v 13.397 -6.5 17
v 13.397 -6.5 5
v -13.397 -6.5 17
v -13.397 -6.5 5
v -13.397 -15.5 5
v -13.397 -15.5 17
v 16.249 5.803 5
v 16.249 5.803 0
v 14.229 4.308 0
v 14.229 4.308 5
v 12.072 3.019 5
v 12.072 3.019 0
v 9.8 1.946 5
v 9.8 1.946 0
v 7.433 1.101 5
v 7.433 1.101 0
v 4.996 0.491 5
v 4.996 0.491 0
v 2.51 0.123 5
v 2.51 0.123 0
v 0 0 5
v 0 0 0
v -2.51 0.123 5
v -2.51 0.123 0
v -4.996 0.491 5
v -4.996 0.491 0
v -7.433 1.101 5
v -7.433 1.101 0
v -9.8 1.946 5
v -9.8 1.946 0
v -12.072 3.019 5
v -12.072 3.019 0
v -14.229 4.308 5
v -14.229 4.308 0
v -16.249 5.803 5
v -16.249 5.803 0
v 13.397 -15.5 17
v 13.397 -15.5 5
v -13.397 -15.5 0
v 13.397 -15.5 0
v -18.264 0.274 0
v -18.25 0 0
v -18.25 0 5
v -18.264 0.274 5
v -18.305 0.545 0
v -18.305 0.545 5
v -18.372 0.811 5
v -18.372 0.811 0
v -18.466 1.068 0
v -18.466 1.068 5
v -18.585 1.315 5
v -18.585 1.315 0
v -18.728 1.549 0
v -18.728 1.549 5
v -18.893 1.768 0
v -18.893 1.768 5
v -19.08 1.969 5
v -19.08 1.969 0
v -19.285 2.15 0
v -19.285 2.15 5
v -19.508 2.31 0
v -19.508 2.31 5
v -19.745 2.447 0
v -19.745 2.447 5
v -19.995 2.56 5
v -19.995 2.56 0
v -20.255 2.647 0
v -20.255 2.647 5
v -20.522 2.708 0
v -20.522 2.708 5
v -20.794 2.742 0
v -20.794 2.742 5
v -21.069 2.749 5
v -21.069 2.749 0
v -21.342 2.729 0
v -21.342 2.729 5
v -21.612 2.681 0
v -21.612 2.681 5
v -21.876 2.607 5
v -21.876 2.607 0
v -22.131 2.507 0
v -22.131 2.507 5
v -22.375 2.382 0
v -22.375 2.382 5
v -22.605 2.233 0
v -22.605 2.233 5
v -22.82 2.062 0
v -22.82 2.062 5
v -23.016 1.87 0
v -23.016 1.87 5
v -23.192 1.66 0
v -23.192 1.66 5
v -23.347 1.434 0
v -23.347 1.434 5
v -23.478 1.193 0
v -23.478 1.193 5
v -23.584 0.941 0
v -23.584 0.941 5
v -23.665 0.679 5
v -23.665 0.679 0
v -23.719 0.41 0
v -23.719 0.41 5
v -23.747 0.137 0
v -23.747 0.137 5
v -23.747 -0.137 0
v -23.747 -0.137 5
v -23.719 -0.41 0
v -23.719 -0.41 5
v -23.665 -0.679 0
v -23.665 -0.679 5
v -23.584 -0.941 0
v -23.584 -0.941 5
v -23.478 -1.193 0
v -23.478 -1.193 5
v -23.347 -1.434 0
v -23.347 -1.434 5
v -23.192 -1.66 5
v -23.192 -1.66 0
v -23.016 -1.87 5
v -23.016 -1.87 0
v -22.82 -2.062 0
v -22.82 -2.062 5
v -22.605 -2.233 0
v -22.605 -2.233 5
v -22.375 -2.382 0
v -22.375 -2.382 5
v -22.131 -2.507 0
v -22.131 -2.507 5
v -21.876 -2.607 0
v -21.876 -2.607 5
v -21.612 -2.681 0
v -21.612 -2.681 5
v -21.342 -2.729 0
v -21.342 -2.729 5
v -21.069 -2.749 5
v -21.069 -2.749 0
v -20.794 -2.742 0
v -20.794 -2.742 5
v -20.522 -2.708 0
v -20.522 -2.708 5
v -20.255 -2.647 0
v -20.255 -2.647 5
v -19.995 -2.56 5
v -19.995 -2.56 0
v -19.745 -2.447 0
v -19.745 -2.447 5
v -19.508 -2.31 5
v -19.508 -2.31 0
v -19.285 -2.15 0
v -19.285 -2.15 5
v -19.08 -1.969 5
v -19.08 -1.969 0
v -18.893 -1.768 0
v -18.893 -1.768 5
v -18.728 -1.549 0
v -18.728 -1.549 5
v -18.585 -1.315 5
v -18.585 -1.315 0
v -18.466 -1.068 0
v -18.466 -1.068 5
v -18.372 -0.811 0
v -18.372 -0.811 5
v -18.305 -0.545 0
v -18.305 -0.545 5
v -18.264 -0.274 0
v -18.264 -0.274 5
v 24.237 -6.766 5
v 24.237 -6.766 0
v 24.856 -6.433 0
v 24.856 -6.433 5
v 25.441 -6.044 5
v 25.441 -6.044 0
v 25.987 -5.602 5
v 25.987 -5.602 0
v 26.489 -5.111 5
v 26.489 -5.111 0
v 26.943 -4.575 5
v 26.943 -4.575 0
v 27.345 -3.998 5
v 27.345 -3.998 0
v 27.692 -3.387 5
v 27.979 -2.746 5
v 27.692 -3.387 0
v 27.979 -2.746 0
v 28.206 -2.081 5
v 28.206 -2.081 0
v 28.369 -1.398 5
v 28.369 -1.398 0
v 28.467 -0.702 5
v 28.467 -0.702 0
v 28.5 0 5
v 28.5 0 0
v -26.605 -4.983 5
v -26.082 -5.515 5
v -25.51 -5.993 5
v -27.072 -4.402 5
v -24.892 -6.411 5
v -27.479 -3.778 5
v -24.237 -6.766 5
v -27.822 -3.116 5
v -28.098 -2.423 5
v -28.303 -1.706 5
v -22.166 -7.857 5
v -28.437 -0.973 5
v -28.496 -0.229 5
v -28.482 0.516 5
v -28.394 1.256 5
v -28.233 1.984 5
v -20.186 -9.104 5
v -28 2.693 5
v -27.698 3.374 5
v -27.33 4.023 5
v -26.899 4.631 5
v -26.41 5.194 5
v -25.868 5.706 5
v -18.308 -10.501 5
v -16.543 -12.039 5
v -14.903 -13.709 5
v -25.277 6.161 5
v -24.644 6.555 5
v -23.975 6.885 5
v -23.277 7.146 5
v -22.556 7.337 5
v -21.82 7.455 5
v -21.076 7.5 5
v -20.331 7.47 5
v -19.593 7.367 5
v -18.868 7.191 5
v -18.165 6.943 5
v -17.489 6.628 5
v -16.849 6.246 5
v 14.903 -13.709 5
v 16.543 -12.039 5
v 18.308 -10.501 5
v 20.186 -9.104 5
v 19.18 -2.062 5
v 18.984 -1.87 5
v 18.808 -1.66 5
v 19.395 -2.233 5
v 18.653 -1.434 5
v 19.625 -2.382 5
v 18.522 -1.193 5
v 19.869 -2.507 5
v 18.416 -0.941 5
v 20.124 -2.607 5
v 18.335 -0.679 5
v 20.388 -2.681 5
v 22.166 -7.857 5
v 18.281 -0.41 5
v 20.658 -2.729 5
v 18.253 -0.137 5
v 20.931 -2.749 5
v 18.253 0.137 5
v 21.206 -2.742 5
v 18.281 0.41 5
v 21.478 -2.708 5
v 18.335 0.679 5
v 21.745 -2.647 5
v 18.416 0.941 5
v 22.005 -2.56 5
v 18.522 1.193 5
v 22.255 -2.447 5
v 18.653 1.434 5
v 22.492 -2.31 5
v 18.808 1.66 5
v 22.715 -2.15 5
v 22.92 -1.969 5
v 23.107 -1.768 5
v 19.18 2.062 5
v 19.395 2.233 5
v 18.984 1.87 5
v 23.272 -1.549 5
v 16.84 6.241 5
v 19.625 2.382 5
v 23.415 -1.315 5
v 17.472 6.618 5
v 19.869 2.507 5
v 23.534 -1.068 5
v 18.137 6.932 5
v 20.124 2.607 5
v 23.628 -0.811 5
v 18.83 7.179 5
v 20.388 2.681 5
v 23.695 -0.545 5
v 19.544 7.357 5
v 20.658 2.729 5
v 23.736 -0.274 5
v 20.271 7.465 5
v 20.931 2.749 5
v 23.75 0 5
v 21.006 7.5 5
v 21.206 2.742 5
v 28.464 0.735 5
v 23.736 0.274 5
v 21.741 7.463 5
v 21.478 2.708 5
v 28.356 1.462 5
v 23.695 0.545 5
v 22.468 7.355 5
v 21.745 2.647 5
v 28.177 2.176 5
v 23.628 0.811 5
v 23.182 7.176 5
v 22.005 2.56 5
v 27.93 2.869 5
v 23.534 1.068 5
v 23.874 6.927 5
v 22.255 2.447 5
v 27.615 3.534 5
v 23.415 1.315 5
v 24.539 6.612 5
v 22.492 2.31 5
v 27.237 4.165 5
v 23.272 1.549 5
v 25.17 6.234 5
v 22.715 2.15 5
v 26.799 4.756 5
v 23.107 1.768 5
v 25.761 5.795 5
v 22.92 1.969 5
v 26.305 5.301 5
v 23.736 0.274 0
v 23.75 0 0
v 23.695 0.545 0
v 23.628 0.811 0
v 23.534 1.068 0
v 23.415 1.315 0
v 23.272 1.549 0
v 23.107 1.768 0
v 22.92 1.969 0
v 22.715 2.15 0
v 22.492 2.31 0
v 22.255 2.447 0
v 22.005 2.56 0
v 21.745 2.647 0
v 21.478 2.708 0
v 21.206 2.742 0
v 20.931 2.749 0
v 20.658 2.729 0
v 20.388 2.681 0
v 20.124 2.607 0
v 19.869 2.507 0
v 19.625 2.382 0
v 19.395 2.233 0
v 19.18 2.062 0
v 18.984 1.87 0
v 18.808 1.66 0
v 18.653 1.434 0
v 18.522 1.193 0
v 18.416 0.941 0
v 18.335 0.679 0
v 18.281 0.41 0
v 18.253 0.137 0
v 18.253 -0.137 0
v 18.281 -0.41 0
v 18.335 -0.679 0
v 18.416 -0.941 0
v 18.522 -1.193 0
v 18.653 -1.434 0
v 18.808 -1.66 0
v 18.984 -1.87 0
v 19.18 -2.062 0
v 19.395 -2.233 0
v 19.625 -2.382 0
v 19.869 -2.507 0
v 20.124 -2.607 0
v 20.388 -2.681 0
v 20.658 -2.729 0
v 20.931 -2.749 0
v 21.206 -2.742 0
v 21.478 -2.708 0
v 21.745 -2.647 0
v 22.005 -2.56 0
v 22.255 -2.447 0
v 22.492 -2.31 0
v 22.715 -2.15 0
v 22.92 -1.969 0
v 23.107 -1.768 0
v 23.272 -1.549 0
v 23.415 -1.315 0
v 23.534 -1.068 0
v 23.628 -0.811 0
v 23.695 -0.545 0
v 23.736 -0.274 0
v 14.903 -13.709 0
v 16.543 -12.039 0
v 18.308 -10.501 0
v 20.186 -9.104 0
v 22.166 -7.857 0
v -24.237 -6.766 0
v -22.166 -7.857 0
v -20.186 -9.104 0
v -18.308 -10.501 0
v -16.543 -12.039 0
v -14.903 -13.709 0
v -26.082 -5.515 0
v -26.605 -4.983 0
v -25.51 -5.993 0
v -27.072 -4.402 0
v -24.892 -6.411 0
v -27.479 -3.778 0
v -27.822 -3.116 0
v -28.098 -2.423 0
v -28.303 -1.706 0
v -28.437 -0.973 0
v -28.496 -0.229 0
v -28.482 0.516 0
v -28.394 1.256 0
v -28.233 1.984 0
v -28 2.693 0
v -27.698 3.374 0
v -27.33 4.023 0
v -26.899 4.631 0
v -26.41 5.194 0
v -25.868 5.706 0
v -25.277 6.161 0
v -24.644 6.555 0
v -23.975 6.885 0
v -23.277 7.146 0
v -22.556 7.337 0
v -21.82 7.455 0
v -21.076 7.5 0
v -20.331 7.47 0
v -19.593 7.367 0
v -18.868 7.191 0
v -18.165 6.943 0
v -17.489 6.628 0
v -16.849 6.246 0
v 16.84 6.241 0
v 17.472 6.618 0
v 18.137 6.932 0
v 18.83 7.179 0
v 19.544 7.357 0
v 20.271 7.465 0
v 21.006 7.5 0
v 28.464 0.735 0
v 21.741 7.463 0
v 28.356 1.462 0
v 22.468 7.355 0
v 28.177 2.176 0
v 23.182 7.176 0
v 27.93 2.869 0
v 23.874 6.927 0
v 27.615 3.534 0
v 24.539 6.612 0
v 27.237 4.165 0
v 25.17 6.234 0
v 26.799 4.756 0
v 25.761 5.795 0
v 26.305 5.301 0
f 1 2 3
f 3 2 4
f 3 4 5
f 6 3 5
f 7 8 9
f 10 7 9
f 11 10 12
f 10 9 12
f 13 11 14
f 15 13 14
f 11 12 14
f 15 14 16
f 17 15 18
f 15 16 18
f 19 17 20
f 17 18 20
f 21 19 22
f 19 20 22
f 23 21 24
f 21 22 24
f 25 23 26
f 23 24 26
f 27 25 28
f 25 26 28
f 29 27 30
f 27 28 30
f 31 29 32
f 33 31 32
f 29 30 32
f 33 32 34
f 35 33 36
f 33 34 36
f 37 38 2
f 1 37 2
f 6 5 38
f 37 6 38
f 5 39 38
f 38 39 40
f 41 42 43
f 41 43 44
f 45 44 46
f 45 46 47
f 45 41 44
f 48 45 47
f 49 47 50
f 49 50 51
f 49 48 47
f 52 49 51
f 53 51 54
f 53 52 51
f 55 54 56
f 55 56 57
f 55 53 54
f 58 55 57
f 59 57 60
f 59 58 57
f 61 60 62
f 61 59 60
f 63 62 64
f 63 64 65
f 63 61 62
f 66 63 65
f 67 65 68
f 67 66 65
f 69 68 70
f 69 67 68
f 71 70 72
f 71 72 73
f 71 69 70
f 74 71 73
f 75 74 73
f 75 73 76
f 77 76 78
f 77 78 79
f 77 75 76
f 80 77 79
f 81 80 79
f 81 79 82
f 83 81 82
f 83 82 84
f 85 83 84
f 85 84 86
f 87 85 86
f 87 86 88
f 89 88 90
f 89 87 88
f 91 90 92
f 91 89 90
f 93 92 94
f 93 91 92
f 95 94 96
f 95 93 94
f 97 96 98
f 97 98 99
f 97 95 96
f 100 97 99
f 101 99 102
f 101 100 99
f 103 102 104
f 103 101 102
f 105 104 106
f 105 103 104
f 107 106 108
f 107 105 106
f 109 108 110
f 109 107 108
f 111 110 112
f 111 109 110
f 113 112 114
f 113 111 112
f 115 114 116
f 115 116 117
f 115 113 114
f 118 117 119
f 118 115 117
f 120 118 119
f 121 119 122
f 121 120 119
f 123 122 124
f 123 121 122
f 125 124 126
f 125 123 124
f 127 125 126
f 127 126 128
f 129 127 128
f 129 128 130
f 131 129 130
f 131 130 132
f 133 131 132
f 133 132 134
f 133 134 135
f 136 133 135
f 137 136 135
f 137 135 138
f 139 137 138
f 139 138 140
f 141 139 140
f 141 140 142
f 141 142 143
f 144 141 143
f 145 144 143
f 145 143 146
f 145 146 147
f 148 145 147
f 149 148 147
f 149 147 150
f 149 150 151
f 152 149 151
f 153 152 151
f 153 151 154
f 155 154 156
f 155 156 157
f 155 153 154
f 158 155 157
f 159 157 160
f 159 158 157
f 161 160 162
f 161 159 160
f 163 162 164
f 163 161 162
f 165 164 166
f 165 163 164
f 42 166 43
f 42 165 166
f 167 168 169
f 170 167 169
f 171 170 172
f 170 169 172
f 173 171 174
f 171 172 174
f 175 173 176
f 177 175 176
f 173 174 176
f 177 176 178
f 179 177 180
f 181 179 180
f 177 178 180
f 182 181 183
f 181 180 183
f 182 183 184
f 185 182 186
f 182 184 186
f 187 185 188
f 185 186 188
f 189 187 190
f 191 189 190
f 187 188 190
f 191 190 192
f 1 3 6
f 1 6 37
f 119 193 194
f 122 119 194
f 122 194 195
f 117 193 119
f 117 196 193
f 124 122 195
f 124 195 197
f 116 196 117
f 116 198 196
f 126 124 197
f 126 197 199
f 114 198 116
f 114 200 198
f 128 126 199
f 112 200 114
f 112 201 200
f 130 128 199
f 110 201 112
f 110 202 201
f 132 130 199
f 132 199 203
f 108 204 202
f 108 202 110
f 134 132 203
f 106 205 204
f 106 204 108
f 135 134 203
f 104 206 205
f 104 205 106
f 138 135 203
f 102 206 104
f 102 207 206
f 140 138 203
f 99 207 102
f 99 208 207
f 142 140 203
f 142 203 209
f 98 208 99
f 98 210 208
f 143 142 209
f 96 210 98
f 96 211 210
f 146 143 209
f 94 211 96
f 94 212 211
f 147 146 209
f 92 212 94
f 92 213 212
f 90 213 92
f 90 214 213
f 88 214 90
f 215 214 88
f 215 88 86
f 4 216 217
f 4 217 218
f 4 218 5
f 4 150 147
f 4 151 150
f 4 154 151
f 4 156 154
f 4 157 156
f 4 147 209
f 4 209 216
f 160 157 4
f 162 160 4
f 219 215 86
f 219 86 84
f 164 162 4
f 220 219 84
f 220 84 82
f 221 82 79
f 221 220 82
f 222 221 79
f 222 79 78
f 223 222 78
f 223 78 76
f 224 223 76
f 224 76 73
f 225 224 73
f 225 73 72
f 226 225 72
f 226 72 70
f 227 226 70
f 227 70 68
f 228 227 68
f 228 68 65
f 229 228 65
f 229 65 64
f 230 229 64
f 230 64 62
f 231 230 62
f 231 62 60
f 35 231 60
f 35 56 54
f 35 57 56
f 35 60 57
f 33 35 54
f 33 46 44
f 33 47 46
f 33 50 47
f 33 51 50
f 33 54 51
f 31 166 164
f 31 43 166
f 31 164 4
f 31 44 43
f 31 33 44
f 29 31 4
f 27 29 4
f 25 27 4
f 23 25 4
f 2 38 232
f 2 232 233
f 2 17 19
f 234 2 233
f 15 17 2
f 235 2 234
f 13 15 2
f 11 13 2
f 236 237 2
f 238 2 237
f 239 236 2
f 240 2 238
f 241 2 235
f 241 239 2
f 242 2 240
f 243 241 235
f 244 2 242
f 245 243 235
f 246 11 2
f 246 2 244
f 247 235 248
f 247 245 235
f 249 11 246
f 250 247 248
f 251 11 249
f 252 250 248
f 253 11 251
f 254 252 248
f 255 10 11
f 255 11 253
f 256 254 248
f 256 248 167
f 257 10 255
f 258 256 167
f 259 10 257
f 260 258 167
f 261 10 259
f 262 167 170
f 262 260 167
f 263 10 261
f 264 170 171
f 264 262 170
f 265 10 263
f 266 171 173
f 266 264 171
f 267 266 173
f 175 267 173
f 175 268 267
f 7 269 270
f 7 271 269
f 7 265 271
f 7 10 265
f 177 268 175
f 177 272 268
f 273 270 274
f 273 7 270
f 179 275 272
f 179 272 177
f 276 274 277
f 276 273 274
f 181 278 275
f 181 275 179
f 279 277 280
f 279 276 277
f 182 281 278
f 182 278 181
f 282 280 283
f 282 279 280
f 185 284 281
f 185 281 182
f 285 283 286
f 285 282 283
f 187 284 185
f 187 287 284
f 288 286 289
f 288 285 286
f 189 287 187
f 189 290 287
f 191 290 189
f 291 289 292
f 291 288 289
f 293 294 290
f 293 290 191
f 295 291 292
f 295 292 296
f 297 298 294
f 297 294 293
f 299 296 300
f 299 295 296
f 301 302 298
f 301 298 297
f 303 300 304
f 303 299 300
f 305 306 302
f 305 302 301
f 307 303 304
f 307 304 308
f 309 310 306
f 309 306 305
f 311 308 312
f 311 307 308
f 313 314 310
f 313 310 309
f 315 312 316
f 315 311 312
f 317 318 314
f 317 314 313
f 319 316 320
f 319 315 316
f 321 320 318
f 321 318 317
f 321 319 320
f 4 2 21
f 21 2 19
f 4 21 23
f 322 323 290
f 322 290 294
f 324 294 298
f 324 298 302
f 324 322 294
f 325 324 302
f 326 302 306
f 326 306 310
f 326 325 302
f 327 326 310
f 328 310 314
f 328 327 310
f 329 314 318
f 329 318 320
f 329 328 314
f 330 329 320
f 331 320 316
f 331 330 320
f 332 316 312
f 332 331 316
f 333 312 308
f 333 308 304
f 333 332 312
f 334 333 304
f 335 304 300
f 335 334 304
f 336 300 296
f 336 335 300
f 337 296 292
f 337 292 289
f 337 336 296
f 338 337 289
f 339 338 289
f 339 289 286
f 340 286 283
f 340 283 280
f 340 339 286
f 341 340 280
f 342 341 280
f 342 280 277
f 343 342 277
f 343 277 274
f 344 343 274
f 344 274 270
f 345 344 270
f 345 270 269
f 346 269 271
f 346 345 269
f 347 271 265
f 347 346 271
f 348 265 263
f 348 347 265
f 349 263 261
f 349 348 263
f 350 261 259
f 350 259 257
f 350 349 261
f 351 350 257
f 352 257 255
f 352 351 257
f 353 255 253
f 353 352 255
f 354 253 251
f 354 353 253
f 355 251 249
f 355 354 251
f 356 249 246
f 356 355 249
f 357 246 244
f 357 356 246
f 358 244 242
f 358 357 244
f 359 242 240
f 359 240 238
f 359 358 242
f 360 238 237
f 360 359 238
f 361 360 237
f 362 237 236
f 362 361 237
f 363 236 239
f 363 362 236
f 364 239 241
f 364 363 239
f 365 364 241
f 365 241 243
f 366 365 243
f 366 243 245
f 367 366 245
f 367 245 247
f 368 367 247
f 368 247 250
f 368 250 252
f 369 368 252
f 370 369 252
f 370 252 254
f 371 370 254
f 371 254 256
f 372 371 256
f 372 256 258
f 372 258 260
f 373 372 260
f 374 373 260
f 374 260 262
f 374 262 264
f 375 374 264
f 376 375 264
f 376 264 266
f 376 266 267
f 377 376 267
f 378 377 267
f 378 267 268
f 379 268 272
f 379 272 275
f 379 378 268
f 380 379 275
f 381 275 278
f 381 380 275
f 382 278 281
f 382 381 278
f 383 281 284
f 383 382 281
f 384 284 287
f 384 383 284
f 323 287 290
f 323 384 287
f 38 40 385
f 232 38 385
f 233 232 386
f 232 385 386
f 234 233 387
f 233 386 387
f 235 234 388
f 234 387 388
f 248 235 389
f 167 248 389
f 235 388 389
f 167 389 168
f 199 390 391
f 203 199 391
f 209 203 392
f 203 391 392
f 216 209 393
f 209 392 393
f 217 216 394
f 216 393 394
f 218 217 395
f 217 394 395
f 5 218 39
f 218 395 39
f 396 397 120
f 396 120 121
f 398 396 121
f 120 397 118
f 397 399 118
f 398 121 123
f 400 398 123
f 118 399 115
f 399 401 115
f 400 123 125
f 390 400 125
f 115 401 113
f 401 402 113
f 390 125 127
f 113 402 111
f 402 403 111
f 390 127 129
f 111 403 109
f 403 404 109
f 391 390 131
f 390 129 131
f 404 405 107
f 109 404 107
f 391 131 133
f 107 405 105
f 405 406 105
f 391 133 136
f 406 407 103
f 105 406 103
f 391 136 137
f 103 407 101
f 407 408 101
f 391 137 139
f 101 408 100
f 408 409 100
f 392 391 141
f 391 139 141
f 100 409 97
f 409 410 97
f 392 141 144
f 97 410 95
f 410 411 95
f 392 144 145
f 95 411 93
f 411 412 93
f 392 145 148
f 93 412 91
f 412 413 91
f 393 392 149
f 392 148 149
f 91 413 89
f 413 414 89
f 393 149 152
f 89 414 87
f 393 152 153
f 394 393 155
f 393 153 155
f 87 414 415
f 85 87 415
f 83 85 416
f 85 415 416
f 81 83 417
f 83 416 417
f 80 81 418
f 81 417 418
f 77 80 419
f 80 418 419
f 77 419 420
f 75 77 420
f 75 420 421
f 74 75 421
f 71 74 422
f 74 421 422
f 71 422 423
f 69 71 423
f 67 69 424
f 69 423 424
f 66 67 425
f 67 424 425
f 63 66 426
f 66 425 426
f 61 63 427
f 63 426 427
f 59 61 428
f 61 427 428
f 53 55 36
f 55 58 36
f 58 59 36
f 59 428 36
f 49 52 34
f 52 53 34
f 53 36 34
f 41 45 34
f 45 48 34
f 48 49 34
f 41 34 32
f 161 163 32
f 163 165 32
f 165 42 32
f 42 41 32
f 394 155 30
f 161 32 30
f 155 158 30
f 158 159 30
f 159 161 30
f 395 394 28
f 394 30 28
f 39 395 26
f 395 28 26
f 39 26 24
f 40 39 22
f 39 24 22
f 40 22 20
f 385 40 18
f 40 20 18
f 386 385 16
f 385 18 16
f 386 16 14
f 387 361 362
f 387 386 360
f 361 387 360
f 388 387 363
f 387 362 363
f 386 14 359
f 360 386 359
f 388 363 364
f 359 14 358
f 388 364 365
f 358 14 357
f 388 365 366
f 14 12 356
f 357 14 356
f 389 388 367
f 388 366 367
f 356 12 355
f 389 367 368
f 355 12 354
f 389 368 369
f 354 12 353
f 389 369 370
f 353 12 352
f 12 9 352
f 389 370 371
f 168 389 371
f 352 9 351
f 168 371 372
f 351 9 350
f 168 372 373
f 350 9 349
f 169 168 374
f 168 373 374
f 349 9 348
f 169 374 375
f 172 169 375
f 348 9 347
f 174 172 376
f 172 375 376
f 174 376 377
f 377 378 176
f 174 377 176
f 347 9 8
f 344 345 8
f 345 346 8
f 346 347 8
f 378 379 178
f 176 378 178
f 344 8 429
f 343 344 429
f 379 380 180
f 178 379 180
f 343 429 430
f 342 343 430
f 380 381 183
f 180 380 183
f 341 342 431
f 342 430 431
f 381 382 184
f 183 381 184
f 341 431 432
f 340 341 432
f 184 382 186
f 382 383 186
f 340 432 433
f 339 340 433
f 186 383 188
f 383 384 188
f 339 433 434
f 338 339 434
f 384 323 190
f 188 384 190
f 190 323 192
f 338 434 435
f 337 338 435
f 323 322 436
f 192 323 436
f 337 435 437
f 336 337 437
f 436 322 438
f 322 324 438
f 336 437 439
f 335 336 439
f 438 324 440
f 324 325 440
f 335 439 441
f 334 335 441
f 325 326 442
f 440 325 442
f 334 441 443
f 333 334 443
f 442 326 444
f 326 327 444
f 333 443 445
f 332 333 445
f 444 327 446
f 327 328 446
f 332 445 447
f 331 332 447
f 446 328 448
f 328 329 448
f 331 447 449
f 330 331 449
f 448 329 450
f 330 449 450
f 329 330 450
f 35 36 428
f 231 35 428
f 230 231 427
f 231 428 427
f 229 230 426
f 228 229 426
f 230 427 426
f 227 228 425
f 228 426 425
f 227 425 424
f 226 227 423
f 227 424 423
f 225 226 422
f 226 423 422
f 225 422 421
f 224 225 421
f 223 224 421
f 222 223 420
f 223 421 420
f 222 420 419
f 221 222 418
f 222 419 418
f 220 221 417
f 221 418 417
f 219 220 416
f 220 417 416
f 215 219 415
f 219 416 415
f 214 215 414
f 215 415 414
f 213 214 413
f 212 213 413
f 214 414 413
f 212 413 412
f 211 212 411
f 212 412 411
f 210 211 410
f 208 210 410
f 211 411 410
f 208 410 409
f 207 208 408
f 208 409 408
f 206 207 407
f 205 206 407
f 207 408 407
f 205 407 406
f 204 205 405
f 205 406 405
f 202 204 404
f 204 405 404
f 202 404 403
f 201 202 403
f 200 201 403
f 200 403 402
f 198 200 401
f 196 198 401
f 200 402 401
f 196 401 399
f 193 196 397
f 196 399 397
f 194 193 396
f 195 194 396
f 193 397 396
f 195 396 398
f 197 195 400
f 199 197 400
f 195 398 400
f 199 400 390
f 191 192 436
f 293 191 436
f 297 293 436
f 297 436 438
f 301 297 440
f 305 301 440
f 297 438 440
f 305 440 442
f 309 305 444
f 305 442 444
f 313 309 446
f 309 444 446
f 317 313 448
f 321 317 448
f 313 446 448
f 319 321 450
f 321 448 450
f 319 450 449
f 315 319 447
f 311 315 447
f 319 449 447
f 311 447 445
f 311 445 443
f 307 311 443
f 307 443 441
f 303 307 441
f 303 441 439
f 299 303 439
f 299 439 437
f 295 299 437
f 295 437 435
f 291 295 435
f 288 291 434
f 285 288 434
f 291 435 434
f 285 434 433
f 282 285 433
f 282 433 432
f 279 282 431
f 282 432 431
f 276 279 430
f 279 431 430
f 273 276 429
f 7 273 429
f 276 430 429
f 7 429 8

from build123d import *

# Parameters (mm, degrees)
F0_R     = 2.75
F1_DEPTH = 5
F3_DEPTH = 12


with BuildPart() as f1:
    # F0 (on Top) → F1 (new body)
    with BuildSketch(Plane.XY):
        with BuildLine():
            ThreePointArc((-16.248869, 5.803167), (-14.221966, 3.210648), (-13.5, 0))
            ThreePointArc((-13.5, 0), (-17.001528, -6.345252), (-24.236593, -6.765683))
            ThreePointArc((-24.236593, -6.765683), (-18.307775, -10.501181), (-13.396906, -15.5))
            Line((-13.396906, -15.5), (13.396906, -15.5))
            ThreePointArc((13.396906, -15.5), (18.307775, -10.501181), (24.236593, -6.765683))
            ThreePointArc((24.236593, -6.765683), (14.670114, -4.022753), (16.248869, 5.803167))
            ThreePointArc((16.248869, 5.803167), (0, 0), (-16.248869, 5.803167))
        make_face()
        with BuildLine():
            ThreePointArc((-24.236593, -6.765683), (-17.001528, -6.345252), (-13.5, 0))
            ThreePointArc((-13.5, 0), (-14.221966, 3.210648), (-16.248869, 5.803167))
            ThreePointArc((-16.248869, 5.803167), (-27.329886, 4.022753), (-24.236593, -6.765683))
        make_face()
        with Locations((-21, 0)):
            Circle(F0_R, mode=Mode.SUBTRACT)
        with BuildLine():
            ThreePointArc((28.5, 0), (24.210648, 6.778034), (16.248869, 5.803167))
            ThreePointArc((16.248869, 5.803167), (14.670114, -4.022753), (24.236593, -6.765683))
            ThreePointArc((24.236593, -6.765683), (27.345252, -3.998472), (28.5, 0))
        make_face()
        with Locations((21, 0)):
            Circle(F0_R, mode=Mode.SUBTRACT)
    extrude(amount=F1_DEPTH)

    # F2 (on face) → F3 (join)
    with BuildSketch(Plane.XY.offset(5)):
        Polygon((13.396906, -6.5), (0, -6.5), (-13.396906, -6.5), (-13.396906, -15.5), (13.396906, -15.5), align=None)
    extrude(amount=F3_DEPTH)


solid = f1.part
